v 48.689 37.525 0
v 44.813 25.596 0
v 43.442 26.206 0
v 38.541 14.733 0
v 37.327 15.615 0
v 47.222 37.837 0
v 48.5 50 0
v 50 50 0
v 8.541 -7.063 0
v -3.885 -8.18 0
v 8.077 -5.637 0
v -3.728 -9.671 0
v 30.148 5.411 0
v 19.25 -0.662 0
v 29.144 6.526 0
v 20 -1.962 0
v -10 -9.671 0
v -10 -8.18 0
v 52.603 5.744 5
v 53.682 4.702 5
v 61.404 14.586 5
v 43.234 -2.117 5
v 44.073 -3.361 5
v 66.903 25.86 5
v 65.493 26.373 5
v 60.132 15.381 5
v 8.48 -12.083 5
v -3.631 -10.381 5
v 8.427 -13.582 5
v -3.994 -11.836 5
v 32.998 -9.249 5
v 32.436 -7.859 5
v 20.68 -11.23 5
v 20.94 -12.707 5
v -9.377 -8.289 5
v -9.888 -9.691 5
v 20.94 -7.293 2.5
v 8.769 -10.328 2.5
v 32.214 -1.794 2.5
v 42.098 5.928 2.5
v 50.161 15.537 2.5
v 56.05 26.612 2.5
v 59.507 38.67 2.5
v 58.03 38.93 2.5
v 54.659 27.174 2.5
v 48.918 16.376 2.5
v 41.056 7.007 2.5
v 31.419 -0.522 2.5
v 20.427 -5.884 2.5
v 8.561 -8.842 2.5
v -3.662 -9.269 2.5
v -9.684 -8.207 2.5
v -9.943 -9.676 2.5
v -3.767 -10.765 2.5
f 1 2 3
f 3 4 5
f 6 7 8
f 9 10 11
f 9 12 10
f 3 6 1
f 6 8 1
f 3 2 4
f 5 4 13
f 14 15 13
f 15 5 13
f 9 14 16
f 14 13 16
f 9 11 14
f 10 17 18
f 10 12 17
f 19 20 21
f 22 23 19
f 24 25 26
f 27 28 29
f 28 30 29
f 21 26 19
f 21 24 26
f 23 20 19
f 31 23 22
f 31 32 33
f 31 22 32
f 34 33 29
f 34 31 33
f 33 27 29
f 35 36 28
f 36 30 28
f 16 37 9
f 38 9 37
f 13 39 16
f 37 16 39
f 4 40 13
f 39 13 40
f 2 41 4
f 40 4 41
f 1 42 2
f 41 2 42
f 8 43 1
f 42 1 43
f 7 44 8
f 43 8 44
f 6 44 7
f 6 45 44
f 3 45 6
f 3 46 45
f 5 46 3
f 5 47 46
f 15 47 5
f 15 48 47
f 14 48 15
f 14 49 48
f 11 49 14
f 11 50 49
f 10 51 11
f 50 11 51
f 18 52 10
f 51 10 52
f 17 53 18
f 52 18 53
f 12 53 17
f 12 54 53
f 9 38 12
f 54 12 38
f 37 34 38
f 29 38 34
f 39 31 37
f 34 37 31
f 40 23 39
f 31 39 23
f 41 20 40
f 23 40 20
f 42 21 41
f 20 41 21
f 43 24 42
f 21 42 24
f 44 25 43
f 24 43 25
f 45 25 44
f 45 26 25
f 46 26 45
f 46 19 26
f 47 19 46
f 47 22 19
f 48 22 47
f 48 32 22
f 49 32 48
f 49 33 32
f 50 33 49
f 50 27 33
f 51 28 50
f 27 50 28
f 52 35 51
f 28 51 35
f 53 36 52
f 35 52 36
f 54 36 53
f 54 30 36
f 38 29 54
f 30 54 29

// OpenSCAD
translate(v = [-10, -10, 0]) {
	linear_extrude(height = 5, twist = 20) {
		intersection() {
			translate(v = [0, 60, 0]) {
				difference() {
					circle(r = 60);
					circle(r = 58.5000000000);
				}
			}
			square(size = 60);
		}
	}
}
